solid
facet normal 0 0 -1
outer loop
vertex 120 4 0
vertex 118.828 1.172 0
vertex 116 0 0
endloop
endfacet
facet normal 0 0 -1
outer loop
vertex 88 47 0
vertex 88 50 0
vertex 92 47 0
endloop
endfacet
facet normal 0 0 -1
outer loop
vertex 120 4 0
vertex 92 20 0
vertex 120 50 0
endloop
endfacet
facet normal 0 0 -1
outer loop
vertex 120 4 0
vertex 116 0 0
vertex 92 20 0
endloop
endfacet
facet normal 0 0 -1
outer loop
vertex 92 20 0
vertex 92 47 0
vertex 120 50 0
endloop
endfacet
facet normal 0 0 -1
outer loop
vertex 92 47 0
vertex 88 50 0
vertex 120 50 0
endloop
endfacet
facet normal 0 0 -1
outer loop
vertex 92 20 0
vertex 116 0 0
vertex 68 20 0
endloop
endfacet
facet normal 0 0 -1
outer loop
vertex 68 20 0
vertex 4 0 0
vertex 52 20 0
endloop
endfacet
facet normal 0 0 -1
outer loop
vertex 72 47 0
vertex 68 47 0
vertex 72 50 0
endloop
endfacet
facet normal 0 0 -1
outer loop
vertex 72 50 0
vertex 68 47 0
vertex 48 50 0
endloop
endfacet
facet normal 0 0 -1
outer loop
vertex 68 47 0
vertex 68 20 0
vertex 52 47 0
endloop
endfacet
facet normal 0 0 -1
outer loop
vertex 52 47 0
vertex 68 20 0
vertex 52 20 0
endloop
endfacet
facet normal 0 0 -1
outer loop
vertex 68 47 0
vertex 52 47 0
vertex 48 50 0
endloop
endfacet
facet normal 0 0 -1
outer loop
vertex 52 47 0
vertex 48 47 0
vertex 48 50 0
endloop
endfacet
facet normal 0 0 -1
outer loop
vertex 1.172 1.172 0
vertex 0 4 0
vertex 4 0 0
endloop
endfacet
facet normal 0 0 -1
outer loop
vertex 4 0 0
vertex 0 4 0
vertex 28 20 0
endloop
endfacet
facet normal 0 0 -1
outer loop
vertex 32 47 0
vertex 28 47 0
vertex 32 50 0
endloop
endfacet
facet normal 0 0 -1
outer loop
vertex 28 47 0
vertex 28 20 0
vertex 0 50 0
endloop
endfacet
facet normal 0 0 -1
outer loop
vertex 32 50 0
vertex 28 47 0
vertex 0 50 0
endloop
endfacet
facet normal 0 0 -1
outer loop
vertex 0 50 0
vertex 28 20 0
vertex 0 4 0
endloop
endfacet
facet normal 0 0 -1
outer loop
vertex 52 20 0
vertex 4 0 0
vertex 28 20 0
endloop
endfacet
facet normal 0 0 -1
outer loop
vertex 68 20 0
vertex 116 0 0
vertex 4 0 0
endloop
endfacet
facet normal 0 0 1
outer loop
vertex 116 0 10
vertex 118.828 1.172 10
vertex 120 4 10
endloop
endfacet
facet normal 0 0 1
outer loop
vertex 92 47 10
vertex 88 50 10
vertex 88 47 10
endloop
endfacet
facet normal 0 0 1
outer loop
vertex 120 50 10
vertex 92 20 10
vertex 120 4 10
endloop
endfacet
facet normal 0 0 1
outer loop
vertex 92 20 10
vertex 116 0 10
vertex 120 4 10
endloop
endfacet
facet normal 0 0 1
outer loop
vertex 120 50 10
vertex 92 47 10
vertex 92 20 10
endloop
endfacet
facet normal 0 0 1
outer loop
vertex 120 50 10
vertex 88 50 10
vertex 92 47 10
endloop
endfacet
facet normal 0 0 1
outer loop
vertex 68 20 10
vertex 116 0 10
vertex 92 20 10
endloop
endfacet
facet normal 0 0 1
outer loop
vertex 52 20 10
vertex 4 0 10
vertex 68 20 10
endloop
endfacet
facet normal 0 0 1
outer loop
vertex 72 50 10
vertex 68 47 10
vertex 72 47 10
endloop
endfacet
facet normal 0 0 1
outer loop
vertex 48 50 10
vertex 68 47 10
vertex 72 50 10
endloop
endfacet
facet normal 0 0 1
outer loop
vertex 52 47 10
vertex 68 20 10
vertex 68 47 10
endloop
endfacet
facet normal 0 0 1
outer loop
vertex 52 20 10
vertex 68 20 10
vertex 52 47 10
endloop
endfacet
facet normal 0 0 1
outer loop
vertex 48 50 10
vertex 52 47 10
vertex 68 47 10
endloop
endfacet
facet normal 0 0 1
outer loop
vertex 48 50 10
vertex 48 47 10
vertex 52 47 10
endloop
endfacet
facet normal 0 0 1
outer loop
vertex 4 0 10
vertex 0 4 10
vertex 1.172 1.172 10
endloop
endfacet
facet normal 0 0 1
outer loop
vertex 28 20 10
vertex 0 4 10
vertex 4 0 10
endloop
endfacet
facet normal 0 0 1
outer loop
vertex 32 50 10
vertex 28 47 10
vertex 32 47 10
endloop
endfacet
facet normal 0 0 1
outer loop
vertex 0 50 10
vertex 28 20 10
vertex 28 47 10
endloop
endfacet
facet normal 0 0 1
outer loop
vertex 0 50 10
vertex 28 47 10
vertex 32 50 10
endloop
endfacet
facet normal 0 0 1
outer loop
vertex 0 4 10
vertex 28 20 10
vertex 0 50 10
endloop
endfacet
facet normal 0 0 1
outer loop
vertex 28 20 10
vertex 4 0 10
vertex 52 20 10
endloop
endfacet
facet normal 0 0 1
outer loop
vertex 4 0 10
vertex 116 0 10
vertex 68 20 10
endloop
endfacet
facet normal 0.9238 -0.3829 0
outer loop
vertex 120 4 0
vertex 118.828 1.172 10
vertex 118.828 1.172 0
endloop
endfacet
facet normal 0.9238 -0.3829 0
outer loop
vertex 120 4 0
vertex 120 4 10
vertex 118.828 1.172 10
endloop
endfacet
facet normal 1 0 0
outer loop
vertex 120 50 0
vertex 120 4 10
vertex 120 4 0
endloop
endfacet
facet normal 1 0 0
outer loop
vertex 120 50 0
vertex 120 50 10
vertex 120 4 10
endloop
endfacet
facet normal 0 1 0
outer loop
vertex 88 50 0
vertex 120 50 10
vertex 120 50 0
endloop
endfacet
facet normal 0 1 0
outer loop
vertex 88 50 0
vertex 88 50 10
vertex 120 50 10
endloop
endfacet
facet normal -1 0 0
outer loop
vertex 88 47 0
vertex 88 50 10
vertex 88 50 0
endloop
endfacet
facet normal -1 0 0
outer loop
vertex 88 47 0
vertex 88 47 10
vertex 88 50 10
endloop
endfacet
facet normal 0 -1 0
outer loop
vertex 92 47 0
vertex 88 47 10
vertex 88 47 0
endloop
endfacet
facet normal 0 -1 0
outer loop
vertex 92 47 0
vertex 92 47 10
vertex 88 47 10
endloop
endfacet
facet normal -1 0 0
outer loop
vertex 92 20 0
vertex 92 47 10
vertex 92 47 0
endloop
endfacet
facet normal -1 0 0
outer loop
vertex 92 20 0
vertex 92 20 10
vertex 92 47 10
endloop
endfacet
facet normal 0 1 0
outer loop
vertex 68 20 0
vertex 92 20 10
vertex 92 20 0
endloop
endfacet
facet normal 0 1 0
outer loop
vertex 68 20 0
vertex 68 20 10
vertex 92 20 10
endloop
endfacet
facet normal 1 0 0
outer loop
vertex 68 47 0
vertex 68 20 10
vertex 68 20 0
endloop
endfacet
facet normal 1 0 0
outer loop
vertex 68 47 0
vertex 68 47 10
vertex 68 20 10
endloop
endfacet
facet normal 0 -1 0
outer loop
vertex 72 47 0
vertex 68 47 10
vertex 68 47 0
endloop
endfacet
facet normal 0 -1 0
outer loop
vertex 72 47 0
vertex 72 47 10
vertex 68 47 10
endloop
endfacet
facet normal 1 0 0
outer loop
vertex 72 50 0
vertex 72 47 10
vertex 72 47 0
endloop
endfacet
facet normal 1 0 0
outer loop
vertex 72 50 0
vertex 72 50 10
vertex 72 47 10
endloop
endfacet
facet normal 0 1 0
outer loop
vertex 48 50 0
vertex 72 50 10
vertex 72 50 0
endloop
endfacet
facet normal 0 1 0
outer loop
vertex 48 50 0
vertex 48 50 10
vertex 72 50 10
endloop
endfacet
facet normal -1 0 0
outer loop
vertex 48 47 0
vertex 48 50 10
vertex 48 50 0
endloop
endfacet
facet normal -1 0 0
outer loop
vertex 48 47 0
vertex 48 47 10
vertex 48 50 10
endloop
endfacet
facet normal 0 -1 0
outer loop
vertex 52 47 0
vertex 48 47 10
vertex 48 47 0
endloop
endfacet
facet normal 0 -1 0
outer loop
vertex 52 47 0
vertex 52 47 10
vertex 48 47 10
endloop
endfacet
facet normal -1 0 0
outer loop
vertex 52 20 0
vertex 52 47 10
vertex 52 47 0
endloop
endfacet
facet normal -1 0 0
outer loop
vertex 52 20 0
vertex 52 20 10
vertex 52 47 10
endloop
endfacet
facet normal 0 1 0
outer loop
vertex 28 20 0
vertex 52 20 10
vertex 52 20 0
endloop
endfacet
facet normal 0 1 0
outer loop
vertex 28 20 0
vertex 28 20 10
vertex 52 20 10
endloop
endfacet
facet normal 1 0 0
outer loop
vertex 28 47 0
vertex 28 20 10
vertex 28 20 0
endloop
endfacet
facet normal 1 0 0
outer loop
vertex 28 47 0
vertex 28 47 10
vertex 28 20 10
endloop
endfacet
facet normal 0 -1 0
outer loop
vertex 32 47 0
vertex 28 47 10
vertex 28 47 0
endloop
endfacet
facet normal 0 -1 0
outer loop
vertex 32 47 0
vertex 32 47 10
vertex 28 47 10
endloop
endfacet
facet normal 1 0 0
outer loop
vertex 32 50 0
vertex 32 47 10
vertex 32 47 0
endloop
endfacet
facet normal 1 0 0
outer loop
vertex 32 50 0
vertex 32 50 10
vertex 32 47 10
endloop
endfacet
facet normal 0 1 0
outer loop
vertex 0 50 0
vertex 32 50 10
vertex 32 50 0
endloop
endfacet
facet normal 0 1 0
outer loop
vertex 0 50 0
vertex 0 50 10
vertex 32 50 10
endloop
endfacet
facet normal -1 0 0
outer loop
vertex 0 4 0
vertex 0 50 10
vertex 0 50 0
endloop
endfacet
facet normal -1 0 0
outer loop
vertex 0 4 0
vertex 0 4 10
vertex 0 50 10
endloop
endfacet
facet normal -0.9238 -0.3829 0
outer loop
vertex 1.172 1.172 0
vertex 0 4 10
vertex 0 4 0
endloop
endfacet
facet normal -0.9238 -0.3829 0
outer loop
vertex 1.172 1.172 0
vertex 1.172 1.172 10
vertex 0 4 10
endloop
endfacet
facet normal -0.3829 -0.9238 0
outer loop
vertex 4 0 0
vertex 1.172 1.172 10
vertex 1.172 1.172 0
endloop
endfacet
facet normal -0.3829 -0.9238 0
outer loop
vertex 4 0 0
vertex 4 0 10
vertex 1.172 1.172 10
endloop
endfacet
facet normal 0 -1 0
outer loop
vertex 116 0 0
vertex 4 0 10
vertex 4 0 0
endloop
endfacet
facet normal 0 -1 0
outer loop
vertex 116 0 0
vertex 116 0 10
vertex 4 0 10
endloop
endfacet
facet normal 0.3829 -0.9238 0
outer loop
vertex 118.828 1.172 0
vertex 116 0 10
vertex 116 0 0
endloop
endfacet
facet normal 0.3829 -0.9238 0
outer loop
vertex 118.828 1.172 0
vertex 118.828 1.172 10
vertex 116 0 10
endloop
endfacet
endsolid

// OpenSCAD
$fn = 32;

// ----------------------------------------------------------------------
// Oversize slot bar: 120 mm bar with 2 oversize windows
// ----------------------------------------------------------------------

// --- parameters (mm) ---
profile_height = 10;      // extrusion height
profile_points = 24;      // points of the closed outline

profile = [[0, 4], [1.172, 1.172], [4, 0], [116, 0], [118.828, 1.172], [120, 4], [120, 50], [88, 50], [88, 47], [92, 47], [92, 20], [68, 20], [68, 47], [72, 47], [72, 50], [48, 50], [48, 47], [52, 47], [52, 20], [28, 20], [28, 47], [32, 47], [32, 50], [0, 50]];  // single closed polygon, 24 points, counter clockwise

// --- the one profile operation ---
linear_extrude(height = profile_height) polygon(points = profile);
